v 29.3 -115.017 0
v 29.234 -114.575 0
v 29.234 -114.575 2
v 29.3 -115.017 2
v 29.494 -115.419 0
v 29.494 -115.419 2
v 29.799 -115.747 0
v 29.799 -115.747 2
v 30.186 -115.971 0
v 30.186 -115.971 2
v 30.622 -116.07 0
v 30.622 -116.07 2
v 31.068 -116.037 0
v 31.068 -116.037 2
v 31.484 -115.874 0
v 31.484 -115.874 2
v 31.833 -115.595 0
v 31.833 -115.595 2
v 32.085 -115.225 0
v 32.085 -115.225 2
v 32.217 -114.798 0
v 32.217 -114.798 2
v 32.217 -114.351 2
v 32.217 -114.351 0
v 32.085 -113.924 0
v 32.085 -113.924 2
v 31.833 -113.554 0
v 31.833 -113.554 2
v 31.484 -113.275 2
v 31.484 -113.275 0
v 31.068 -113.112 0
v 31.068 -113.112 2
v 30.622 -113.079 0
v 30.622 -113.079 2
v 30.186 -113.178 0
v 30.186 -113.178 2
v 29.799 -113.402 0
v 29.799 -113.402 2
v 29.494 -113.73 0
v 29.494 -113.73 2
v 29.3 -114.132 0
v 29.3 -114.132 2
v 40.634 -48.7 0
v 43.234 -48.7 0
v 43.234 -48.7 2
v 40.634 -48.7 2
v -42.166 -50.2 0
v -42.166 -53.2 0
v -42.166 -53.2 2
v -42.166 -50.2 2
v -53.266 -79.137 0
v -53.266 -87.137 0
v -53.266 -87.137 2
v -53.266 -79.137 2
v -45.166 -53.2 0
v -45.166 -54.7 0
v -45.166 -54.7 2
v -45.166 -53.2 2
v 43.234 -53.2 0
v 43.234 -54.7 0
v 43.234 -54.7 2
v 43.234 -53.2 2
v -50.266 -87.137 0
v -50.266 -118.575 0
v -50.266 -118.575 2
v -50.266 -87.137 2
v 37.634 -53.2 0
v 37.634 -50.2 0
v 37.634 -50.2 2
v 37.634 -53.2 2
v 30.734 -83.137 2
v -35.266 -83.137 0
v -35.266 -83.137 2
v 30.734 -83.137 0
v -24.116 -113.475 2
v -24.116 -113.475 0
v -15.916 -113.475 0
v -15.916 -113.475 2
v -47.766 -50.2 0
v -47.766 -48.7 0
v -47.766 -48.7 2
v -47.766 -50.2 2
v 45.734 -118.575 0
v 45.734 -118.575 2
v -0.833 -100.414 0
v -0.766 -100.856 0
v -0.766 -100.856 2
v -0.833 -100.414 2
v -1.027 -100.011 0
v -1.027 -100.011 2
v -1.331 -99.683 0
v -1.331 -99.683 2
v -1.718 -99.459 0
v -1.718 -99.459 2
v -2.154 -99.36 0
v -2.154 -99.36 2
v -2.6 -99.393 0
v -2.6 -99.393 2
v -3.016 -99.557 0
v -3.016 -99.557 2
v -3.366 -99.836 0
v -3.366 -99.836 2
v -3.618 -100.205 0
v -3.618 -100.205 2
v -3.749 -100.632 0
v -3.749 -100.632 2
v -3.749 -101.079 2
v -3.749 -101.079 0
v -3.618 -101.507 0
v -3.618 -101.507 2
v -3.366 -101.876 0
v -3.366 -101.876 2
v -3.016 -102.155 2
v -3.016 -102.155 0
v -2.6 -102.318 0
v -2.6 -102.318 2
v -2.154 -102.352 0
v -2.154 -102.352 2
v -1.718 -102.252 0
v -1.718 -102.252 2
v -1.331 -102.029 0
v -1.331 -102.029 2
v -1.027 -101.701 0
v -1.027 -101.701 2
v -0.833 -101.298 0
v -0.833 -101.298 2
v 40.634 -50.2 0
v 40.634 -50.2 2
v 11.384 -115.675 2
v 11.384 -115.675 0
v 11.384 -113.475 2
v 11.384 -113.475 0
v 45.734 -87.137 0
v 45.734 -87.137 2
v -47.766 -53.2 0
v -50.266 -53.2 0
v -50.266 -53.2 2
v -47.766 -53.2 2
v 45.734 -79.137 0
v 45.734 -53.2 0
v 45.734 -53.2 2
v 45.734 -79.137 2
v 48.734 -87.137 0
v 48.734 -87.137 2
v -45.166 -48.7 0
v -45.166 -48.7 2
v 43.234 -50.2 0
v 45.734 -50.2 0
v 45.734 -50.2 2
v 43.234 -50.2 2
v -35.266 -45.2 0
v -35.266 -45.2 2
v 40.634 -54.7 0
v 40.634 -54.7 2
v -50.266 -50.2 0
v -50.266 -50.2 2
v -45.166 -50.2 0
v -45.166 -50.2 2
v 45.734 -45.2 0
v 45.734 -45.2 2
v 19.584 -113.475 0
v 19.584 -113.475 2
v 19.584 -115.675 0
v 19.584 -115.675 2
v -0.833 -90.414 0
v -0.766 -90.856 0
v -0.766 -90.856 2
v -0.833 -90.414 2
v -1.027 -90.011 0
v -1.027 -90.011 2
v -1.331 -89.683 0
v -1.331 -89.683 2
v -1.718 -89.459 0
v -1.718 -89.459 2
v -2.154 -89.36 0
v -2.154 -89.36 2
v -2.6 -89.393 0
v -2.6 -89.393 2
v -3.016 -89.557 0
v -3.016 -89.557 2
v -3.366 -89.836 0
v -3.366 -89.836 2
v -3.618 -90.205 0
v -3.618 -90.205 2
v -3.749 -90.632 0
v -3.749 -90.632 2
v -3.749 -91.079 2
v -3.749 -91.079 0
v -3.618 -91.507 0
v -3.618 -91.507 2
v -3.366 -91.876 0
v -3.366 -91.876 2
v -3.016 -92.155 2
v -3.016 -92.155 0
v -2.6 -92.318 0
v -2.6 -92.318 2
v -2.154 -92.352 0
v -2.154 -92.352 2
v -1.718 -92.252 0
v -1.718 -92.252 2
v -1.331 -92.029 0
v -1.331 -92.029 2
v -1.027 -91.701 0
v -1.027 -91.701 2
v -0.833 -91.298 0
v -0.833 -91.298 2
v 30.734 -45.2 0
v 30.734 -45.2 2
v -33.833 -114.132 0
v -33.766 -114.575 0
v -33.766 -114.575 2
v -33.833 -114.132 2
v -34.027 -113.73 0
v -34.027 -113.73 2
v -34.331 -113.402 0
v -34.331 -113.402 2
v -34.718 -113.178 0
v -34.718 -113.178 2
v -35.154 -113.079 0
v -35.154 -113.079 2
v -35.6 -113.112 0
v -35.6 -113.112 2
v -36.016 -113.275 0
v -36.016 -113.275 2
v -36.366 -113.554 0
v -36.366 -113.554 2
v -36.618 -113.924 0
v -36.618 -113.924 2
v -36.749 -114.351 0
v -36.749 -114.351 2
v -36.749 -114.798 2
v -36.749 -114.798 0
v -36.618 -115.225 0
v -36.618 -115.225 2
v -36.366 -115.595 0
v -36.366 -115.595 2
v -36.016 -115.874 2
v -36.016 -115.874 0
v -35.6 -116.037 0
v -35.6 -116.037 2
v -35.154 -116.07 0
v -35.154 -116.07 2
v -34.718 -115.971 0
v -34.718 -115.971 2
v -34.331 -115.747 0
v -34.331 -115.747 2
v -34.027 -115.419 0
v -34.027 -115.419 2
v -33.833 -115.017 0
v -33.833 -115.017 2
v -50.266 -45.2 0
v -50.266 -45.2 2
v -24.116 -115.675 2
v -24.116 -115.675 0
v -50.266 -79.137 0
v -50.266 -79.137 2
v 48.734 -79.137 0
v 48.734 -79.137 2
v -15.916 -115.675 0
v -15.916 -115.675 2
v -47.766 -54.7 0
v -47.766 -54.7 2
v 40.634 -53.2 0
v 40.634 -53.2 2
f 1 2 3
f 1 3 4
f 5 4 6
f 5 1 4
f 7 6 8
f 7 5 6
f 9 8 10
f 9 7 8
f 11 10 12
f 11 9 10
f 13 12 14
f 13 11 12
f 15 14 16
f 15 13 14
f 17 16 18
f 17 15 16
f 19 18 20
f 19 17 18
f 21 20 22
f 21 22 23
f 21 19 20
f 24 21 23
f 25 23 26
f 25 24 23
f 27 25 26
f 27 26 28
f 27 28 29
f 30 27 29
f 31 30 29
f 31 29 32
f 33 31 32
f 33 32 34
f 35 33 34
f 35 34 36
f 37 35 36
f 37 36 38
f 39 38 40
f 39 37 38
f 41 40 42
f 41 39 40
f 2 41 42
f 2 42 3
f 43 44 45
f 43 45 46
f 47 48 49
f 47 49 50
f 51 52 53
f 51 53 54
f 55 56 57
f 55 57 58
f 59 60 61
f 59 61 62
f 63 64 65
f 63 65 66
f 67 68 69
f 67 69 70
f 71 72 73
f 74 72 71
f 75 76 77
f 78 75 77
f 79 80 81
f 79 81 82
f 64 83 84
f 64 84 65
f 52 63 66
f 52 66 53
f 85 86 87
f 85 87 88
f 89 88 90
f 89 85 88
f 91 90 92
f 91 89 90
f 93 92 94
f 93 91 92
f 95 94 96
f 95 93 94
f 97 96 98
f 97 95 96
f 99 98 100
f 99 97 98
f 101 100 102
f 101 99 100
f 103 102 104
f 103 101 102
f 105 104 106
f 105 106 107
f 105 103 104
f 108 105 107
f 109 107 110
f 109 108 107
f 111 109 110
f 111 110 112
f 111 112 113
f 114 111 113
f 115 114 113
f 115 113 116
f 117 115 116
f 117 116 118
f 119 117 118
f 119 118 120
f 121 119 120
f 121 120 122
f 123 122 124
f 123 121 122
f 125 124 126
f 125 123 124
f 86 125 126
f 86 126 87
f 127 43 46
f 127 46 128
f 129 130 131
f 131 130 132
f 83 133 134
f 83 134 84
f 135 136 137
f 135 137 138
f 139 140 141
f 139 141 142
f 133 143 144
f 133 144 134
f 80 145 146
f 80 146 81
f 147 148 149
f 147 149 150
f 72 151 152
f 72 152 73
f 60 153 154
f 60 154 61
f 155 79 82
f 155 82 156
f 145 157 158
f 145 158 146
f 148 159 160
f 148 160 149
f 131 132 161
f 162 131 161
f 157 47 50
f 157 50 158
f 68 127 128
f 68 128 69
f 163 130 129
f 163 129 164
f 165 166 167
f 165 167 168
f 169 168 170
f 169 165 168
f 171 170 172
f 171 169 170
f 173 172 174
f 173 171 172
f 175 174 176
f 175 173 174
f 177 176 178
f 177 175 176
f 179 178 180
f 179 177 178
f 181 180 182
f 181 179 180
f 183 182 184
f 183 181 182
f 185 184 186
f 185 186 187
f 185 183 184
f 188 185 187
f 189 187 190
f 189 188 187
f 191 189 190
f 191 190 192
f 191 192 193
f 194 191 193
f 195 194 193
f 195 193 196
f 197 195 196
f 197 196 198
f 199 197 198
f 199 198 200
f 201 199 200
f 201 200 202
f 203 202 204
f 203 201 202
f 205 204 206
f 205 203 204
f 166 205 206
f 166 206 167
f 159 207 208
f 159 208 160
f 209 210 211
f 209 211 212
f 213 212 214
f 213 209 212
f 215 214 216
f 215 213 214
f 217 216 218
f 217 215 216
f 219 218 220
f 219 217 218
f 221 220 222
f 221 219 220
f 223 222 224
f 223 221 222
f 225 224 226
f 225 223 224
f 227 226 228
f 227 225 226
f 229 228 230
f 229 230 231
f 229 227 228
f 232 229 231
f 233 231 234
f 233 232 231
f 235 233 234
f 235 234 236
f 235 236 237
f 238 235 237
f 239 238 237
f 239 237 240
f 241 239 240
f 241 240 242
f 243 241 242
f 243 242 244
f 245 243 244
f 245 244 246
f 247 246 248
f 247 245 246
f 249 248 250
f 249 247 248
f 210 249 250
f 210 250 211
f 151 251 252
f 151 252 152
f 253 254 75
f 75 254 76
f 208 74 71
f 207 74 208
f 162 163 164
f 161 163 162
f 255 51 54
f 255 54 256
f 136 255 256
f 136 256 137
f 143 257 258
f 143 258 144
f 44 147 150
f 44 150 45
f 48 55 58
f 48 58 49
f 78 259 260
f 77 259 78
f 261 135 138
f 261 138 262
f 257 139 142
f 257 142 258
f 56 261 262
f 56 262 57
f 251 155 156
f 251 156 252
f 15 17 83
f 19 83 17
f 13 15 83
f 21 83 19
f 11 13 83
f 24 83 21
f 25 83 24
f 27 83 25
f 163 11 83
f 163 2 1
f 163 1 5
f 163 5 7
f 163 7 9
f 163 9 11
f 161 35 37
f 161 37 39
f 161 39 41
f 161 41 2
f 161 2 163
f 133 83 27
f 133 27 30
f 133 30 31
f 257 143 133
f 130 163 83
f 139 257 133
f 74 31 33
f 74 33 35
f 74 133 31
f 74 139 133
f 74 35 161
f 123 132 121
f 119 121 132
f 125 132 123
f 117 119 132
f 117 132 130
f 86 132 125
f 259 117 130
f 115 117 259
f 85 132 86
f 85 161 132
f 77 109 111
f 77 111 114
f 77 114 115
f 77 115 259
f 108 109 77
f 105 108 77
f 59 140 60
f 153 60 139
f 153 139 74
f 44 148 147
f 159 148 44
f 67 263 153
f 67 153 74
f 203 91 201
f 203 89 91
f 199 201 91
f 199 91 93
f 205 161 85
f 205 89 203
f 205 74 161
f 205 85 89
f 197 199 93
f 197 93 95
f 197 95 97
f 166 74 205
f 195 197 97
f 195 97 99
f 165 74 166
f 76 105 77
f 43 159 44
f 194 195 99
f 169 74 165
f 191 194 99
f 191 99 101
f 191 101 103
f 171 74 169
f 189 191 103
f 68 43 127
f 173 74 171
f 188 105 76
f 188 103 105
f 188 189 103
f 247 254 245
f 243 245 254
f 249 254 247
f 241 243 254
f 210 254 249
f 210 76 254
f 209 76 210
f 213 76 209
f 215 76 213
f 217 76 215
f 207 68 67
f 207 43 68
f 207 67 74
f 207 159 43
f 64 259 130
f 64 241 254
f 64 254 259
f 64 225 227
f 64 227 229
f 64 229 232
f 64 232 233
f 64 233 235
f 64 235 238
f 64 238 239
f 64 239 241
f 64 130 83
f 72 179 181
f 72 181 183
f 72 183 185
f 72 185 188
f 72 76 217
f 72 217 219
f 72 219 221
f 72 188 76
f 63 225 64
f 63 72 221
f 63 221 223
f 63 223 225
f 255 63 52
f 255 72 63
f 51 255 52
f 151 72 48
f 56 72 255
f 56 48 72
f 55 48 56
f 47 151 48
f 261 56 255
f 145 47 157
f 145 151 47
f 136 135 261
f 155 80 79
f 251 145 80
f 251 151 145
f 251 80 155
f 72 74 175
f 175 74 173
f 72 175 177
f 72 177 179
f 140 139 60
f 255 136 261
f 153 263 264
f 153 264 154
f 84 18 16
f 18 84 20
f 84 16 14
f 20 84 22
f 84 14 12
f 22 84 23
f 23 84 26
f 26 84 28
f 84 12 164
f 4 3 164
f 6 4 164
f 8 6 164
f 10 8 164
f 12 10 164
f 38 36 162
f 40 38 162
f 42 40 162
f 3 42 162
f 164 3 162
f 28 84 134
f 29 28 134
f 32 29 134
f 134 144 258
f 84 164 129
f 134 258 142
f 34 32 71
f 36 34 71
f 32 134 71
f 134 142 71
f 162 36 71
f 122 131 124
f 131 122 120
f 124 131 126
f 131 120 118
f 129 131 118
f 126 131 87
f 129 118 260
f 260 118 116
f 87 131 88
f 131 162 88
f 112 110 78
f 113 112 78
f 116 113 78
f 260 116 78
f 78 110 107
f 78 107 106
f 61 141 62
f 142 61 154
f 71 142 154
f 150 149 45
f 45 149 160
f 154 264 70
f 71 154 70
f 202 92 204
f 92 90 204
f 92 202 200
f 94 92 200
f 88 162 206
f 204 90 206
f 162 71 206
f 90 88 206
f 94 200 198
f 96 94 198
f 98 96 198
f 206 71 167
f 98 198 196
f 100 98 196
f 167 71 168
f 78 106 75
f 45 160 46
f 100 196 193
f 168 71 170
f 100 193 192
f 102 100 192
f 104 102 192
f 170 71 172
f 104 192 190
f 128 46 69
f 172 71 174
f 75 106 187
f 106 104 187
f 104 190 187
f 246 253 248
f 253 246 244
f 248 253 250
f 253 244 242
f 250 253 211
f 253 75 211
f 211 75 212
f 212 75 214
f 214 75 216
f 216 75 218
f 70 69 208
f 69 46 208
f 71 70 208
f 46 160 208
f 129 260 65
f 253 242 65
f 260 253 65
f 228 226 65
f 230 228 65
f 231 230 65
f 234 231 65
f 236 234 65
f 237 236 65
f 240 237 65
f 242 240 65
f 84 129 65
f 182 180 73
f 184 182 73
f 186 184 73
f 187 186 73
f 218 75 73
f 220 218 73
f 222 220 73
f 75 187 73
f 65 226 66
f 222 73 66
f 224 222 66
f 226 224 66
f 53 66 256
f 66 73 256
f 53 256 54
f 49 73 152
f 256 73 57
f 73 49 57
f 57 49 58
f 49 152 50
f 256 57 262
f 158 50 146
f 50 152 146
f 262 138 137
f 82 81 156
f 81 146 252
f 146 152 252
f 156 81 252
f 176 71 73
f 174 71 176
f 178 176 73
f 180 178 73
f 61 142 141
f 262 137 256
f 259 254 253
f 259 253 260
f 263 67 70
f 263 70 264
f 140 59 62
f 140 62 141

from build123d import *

# Parameters (mm, degrees)
SKETCH_1_R      = 1.5
SKETCH_1_W      = 8.2
SKETCH_1_H      = 2.2
EXTRUDE_1_DEPTH = 2


with BuildPart() as part:
    # 草图1 → 凸台-拉伸1 (new body)
    with BuildSketch(Plane.XY):
        Polygon((-47.766155614, -53.199512395), (-47.766155614, -54.699512395), (-45.166155614, -54.699512395), (-45.166155614, -53.199512395), (-42.166155614, -53.199512395), (-42.166155614, -50.199512395), (-45.166155614, -50.199512395), (-45.166155614, -48.699512395), (-47.766155614, -48.699512395), (-47.766155614, -50.199512395), (-50.266155614, -50.199512395), (-50.266155614, -45.199512395), (-35.266155614, -45.199512395), (-35.266155614, -83.137012395), (30.733844386, -83.137012395), (30.733844386, -45.199512395), (45.733844386, -45.199512395), (45.733844386, -50.199512395), (43.233844386, -50.199512395), (43.233844386, -48.699512395), (40.633844386, -48.699512395), (40.633844386, -50.199512395), (37.633844386, -50.199512395), (37.633844386, -53.199512395), (40.633844386, -53.199512395), (40.633844386, -54.699512395), (43.233844386, -54.699512395), (43.233844386, -53.199512395), (45.733844386, -53.199512395), (45.733844386, -79.137012395), (48.733844386, -79.137012395), (48.733844386, -87.137012395), (45.733844386, -87.137012395), (45.733844386, -118.574512395), (-50.266155614, -118.574512395), (-50.266155614, -87.137012395), (-53.266155614, -87.137012395), (-53.266155614, -79.137012395), (-50.266155614, -79.137012395), (-50.266155614, -53.199512395), align=None)
        with Locations((-35.266155614, -114.574512395)):
            Circle(SKETCH_1_R, mode=Mode.SUBTRACT)
        with Locations(Location((30.733844386, -114.574512395, 0), (0, 0, 180))):
            Circle(SKETCH_1_R, mode=Mode.SUBTRACT)
        with Locations((-2.266155614, -100.855762395)):
            Circle(SKETCH_1_R, mode=Mode.SUBTRACT)
        with Locations((-2.266155614, -90.855762395)):
            Circle(SKETCH_1_R, mode=Mode.SUBTRACT)
        with Locations((-20.016155614, -114.574512396)):
            Rectangle(SKETCH_1_W, SKETCH_1_H, mode=Mode.SUBTRACT)
        with Locations((15.483844386, -114.574512396)):
            Rectangle(SKETCH_1_W, SKETCH_1_H, mode=Mode.SUBTRACT)
    extrude(amount=EXTRUDE_1_DEPTH)


solid = part.part
